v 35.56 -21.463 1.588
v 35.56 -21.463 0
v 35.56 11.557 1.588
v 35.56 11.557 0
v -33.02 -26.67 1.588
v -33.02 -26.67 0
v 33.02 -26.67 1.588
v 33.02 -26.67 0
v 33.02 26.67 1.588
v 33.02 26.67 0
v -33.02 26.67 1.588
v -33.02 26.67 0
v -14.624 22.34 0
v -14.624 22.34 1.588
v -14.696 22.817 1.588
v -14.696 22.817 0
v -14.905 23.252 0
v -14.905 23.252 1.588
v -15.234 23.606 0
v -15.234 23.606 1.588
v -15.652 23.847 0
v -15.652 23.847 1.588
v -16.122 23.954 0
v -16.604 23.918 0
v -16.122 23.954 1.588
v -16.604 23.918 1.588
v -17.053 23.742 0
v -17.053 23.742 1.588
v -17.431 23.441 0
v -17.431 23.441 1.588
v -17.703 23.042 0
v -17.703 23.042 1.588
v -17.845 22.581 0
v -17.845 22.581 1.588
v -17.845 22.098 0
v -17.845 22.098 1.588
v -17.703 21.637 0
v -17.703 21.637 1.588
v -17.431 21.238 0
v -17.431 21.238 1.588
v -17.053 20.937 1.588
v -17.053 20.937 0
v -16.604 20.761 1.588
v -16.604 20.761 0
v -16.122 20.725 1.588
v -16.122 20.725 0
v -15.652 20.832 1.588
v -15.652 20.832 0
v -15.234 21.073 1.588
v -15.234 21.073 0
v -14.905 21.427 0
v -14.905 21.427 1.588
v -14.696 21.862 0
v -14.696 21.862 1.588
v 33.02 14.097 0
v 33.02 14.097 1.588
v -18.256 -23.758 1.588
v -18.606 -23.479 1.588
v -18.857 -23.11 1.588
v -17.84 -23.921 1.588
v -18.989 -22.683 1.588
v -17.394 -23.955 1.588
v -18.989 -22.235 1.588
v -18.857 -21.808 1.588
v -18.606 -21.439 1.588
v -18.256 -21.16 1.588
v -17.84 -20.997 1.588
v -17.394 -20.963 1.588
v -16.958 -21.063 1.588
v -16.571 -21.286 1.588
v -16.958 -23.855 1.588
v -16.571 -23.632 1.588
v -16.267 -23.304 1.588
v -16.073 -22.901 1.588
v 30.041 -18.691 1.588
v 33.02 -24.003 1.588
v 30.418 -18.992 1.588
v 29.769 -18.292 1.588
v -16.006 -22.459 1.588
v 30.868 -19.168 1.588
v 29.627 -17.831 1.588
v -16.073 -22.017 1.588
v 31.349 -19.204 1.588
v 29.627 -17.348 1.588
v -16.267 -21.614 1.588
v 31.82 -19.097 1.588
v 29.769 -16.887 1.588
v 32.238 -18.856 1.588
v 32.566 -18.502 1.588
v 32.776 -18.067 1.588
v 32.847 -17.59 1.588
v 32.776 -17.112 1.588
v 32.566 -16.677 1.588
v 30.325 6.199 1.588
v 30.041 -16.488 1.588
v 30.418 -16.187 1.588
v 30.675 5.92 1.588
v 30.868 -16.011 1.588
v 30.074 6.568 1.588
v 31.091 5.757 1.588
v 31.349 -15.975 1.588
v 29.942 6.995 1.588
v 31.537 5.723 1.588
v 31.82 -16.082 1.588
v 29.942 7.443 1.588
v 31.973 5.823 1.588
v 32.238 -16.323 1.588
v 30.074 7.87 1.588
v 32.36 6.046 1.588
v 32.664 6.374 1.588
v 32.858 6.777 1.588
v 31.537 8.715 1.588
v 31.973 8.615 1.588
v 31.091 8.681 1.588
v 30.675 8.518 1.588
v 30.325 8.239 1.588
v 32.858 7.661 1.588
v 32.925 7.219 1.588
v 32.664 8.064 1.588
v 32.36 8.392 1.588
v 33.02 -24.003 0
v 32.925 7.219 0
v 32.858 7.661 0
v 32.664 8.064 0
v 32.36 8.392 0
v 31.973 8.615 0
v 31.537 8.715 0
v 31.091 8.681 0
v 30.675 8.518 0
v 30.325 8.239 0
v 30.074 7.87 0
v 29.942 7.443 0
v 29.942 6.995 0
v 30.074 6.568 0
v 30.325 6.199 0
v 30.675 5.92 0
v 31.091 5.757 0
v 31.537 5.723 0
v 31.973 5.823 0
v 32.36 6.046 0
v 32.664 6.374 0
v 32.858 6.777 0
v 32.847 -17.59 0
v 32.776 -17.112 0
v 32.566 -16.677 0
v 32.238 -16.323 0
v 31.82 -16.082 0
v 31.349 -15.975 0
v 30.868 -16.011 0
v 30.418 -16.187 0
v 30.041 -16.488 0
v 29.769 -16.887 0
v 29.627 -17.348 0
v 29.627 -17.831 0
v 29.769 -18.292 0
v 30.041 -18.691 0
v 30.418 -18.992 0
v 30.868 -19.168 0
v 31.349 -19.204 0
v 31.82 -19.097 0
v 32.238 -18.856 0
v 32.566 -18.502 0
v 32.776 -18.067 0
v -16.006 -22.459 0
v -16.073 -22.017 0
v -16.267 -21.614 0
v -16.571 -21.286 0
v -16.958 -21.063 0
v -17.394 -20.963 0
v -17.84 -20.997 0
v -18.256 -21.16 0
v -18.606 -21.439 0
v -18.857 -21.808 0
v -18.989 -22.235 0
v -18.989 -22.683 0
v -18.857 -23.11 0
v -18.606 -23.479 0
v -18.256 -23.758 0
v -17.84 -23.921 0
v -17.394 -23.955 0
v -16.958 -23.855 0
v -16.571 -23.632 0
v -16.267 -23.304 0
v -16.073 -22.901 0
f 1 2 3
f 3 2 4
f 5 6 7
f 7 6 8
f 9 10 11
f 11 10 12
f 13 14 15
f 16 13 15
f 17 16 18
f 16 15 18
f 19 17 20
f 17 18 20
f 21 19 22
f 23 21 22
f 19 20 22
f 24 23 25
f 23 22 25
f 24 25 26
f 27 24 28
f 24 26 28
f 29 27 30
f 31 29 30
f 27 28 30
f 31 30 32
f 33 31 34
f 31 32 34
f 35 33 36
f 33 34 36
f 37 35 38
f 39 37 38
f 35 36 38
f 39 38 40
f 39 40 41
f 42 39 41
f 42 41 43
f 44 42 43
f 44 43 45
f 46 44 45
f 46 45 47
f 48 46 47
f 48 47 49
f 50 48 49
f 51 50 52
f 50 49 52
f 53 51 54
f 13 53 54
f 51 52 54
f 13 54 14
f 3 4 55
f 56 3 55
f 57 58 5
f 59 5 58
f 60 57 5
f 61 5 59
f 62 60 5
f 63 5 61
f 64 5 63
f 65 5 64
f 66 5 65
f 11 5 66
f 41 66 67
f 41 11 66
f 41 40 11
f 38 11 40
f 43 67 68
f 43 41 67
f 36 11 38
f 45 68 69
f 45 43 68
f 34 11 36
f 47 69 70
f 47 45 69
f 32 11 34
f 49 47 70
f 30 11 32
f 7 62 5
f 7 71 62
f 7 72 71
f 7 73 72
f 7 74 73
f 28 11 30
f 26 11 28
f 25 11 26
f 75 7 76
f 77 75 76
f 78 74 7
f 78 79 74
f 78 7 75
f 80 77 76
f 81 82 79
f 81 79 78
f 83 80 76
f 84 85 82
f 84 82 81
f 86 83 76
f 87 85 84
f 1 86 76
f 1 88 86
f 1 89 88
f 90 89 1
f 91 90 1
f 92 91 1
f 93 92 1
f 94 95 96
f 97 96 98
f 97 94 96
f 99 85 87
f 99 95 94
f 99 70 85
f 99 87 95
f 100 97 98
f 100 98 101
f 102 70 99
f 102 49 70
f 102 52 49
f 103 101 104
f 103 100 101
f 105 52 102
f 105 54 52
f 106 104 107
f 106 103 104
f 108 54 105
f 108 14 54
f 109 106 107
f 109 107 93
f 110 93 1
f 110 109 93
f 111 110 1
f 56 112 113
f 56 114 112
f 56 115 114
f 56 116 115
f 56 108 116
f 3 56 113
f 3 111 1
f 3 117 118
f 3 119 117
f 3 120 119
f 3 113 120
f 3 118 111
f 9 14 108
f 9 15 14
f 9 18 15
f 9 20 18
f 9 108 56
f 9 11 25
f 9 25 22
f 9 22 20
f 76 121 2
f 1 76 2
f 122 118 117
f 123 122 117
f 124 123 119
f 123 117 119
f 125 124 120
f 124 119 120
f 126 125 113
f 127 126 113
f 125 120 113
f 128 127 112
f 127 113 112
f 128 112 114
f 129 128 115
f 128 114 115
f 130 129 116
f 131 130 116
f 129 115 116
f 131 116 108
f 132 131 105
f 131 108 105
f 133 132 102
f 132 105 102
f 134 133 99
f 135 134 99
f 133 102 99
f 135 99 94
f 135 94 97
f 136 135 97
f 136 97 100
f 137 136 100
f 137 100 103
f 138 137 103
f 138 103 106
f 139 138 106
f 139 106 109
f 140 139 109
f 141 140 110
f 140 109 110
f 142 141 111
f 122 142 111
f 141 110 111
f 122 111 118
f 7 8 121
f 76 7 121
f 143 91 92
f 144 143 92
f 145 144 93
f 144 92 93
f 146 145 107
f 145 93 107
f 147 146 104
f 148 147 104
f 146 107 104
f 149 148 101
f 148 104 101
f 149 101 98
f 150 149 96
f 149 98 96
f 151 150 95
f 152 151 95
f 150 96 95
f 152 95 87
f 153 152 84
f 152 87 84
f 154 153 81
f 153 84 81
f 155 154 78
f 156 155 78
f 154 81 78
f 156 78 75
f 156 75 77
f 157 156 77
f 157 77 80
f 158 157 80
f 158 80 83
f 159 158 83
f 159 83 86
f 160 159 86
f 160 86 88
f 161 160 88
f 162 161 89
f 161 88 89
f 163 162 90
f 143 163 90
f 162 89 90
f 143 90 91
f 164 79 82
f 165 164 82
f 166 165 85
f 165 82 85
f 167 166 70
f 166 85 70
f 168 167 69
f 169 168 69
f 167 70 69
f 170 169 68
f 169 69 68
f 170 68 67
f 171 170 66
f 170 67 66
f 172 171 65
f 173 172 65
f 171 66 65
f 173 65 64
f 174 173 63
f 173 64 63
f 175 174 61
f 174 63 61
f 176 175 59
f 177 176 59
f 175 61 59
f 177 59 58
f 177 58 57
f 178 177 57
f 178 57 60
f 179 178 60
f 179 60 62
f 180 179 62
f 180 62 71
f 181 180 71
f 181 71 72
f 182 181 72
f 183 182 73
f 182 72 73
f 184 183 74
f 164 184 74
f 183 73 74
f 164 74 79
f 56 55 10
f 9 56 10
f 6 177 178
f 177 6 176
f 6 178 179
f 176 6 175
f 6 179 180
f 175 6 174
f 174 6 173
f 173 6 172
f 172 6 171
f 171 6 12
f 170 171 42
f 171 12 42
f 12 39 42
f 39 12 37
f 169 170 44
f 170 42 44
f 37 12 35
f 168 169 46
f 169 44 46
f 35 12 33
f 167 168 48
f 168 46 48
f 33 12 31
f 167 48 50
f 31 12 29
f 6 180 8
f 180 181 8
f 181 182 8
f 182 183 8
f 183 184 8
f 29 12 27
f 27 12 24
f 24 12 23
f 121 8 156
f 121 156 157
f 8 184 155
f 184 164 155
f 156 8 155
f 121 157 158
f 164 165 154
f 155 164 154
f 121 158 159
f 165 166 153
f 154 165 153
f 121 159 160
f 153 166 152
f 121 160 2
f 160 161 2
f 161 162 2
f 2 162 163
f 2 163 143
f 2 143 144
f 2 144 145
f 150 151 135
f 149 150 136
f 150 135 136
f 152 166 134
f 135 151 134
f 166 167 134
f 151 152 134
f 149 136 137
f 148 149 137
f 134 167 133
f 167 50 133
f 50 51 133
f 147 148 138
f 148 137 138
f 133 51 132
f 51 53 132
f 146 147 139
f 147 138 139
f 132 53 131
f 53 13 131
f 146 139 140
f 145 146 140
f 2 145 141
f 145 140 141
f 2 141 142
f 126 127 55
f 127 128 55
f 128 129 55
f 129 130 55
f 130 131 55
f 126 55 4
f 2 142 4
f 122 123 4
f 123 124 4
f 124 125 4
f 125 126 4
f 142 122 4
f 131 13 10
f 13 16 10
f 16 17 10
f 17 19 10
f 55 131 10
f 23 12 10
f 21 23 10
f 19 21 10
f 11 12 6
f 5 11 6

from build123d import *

# Parameters (mm, degrees)
F1_DEPTH = 1.588
F2_R     = 1.6195
F2_R_2   = 1.5
F3_DEPTH = 1.588


with BuildPart() as f1:
    # F0 (on Top) → F1 (new body)
    with BuildSketch(Plane.XY):
        Polygon((35.56, 11.557), (33.02, 14.097), (33.02, -24.003), (35.56, -21.463), align=None)
        Polygon((33.02, 26.67), (-33.02, 26.67), (-33.02, -26.67), (33.02, -26.67), (33.02, -24.003), (33.02, 14.097), align=None)
    extrude(amount=F1_DEPTH)

    # F2 (on face) → F3 (cut)
    with BuildSketch(Plane.XY.offset(1.588)):
        with Locations((-16.2435, 22.3395)):
            Circle(F2_R)
        with Locations((-17.506, -22.459)):
            Circle(F2_R_2)
        with Locations((31.227971, -17.5895)):
            Circle(F2_R)
        with Locations((31.425, 7.219)):
            Circle(F2_R_2)
    extrude(amount=-F3_DEPTH, mode=Mode.SUBTRACT)


solid = f1.part
